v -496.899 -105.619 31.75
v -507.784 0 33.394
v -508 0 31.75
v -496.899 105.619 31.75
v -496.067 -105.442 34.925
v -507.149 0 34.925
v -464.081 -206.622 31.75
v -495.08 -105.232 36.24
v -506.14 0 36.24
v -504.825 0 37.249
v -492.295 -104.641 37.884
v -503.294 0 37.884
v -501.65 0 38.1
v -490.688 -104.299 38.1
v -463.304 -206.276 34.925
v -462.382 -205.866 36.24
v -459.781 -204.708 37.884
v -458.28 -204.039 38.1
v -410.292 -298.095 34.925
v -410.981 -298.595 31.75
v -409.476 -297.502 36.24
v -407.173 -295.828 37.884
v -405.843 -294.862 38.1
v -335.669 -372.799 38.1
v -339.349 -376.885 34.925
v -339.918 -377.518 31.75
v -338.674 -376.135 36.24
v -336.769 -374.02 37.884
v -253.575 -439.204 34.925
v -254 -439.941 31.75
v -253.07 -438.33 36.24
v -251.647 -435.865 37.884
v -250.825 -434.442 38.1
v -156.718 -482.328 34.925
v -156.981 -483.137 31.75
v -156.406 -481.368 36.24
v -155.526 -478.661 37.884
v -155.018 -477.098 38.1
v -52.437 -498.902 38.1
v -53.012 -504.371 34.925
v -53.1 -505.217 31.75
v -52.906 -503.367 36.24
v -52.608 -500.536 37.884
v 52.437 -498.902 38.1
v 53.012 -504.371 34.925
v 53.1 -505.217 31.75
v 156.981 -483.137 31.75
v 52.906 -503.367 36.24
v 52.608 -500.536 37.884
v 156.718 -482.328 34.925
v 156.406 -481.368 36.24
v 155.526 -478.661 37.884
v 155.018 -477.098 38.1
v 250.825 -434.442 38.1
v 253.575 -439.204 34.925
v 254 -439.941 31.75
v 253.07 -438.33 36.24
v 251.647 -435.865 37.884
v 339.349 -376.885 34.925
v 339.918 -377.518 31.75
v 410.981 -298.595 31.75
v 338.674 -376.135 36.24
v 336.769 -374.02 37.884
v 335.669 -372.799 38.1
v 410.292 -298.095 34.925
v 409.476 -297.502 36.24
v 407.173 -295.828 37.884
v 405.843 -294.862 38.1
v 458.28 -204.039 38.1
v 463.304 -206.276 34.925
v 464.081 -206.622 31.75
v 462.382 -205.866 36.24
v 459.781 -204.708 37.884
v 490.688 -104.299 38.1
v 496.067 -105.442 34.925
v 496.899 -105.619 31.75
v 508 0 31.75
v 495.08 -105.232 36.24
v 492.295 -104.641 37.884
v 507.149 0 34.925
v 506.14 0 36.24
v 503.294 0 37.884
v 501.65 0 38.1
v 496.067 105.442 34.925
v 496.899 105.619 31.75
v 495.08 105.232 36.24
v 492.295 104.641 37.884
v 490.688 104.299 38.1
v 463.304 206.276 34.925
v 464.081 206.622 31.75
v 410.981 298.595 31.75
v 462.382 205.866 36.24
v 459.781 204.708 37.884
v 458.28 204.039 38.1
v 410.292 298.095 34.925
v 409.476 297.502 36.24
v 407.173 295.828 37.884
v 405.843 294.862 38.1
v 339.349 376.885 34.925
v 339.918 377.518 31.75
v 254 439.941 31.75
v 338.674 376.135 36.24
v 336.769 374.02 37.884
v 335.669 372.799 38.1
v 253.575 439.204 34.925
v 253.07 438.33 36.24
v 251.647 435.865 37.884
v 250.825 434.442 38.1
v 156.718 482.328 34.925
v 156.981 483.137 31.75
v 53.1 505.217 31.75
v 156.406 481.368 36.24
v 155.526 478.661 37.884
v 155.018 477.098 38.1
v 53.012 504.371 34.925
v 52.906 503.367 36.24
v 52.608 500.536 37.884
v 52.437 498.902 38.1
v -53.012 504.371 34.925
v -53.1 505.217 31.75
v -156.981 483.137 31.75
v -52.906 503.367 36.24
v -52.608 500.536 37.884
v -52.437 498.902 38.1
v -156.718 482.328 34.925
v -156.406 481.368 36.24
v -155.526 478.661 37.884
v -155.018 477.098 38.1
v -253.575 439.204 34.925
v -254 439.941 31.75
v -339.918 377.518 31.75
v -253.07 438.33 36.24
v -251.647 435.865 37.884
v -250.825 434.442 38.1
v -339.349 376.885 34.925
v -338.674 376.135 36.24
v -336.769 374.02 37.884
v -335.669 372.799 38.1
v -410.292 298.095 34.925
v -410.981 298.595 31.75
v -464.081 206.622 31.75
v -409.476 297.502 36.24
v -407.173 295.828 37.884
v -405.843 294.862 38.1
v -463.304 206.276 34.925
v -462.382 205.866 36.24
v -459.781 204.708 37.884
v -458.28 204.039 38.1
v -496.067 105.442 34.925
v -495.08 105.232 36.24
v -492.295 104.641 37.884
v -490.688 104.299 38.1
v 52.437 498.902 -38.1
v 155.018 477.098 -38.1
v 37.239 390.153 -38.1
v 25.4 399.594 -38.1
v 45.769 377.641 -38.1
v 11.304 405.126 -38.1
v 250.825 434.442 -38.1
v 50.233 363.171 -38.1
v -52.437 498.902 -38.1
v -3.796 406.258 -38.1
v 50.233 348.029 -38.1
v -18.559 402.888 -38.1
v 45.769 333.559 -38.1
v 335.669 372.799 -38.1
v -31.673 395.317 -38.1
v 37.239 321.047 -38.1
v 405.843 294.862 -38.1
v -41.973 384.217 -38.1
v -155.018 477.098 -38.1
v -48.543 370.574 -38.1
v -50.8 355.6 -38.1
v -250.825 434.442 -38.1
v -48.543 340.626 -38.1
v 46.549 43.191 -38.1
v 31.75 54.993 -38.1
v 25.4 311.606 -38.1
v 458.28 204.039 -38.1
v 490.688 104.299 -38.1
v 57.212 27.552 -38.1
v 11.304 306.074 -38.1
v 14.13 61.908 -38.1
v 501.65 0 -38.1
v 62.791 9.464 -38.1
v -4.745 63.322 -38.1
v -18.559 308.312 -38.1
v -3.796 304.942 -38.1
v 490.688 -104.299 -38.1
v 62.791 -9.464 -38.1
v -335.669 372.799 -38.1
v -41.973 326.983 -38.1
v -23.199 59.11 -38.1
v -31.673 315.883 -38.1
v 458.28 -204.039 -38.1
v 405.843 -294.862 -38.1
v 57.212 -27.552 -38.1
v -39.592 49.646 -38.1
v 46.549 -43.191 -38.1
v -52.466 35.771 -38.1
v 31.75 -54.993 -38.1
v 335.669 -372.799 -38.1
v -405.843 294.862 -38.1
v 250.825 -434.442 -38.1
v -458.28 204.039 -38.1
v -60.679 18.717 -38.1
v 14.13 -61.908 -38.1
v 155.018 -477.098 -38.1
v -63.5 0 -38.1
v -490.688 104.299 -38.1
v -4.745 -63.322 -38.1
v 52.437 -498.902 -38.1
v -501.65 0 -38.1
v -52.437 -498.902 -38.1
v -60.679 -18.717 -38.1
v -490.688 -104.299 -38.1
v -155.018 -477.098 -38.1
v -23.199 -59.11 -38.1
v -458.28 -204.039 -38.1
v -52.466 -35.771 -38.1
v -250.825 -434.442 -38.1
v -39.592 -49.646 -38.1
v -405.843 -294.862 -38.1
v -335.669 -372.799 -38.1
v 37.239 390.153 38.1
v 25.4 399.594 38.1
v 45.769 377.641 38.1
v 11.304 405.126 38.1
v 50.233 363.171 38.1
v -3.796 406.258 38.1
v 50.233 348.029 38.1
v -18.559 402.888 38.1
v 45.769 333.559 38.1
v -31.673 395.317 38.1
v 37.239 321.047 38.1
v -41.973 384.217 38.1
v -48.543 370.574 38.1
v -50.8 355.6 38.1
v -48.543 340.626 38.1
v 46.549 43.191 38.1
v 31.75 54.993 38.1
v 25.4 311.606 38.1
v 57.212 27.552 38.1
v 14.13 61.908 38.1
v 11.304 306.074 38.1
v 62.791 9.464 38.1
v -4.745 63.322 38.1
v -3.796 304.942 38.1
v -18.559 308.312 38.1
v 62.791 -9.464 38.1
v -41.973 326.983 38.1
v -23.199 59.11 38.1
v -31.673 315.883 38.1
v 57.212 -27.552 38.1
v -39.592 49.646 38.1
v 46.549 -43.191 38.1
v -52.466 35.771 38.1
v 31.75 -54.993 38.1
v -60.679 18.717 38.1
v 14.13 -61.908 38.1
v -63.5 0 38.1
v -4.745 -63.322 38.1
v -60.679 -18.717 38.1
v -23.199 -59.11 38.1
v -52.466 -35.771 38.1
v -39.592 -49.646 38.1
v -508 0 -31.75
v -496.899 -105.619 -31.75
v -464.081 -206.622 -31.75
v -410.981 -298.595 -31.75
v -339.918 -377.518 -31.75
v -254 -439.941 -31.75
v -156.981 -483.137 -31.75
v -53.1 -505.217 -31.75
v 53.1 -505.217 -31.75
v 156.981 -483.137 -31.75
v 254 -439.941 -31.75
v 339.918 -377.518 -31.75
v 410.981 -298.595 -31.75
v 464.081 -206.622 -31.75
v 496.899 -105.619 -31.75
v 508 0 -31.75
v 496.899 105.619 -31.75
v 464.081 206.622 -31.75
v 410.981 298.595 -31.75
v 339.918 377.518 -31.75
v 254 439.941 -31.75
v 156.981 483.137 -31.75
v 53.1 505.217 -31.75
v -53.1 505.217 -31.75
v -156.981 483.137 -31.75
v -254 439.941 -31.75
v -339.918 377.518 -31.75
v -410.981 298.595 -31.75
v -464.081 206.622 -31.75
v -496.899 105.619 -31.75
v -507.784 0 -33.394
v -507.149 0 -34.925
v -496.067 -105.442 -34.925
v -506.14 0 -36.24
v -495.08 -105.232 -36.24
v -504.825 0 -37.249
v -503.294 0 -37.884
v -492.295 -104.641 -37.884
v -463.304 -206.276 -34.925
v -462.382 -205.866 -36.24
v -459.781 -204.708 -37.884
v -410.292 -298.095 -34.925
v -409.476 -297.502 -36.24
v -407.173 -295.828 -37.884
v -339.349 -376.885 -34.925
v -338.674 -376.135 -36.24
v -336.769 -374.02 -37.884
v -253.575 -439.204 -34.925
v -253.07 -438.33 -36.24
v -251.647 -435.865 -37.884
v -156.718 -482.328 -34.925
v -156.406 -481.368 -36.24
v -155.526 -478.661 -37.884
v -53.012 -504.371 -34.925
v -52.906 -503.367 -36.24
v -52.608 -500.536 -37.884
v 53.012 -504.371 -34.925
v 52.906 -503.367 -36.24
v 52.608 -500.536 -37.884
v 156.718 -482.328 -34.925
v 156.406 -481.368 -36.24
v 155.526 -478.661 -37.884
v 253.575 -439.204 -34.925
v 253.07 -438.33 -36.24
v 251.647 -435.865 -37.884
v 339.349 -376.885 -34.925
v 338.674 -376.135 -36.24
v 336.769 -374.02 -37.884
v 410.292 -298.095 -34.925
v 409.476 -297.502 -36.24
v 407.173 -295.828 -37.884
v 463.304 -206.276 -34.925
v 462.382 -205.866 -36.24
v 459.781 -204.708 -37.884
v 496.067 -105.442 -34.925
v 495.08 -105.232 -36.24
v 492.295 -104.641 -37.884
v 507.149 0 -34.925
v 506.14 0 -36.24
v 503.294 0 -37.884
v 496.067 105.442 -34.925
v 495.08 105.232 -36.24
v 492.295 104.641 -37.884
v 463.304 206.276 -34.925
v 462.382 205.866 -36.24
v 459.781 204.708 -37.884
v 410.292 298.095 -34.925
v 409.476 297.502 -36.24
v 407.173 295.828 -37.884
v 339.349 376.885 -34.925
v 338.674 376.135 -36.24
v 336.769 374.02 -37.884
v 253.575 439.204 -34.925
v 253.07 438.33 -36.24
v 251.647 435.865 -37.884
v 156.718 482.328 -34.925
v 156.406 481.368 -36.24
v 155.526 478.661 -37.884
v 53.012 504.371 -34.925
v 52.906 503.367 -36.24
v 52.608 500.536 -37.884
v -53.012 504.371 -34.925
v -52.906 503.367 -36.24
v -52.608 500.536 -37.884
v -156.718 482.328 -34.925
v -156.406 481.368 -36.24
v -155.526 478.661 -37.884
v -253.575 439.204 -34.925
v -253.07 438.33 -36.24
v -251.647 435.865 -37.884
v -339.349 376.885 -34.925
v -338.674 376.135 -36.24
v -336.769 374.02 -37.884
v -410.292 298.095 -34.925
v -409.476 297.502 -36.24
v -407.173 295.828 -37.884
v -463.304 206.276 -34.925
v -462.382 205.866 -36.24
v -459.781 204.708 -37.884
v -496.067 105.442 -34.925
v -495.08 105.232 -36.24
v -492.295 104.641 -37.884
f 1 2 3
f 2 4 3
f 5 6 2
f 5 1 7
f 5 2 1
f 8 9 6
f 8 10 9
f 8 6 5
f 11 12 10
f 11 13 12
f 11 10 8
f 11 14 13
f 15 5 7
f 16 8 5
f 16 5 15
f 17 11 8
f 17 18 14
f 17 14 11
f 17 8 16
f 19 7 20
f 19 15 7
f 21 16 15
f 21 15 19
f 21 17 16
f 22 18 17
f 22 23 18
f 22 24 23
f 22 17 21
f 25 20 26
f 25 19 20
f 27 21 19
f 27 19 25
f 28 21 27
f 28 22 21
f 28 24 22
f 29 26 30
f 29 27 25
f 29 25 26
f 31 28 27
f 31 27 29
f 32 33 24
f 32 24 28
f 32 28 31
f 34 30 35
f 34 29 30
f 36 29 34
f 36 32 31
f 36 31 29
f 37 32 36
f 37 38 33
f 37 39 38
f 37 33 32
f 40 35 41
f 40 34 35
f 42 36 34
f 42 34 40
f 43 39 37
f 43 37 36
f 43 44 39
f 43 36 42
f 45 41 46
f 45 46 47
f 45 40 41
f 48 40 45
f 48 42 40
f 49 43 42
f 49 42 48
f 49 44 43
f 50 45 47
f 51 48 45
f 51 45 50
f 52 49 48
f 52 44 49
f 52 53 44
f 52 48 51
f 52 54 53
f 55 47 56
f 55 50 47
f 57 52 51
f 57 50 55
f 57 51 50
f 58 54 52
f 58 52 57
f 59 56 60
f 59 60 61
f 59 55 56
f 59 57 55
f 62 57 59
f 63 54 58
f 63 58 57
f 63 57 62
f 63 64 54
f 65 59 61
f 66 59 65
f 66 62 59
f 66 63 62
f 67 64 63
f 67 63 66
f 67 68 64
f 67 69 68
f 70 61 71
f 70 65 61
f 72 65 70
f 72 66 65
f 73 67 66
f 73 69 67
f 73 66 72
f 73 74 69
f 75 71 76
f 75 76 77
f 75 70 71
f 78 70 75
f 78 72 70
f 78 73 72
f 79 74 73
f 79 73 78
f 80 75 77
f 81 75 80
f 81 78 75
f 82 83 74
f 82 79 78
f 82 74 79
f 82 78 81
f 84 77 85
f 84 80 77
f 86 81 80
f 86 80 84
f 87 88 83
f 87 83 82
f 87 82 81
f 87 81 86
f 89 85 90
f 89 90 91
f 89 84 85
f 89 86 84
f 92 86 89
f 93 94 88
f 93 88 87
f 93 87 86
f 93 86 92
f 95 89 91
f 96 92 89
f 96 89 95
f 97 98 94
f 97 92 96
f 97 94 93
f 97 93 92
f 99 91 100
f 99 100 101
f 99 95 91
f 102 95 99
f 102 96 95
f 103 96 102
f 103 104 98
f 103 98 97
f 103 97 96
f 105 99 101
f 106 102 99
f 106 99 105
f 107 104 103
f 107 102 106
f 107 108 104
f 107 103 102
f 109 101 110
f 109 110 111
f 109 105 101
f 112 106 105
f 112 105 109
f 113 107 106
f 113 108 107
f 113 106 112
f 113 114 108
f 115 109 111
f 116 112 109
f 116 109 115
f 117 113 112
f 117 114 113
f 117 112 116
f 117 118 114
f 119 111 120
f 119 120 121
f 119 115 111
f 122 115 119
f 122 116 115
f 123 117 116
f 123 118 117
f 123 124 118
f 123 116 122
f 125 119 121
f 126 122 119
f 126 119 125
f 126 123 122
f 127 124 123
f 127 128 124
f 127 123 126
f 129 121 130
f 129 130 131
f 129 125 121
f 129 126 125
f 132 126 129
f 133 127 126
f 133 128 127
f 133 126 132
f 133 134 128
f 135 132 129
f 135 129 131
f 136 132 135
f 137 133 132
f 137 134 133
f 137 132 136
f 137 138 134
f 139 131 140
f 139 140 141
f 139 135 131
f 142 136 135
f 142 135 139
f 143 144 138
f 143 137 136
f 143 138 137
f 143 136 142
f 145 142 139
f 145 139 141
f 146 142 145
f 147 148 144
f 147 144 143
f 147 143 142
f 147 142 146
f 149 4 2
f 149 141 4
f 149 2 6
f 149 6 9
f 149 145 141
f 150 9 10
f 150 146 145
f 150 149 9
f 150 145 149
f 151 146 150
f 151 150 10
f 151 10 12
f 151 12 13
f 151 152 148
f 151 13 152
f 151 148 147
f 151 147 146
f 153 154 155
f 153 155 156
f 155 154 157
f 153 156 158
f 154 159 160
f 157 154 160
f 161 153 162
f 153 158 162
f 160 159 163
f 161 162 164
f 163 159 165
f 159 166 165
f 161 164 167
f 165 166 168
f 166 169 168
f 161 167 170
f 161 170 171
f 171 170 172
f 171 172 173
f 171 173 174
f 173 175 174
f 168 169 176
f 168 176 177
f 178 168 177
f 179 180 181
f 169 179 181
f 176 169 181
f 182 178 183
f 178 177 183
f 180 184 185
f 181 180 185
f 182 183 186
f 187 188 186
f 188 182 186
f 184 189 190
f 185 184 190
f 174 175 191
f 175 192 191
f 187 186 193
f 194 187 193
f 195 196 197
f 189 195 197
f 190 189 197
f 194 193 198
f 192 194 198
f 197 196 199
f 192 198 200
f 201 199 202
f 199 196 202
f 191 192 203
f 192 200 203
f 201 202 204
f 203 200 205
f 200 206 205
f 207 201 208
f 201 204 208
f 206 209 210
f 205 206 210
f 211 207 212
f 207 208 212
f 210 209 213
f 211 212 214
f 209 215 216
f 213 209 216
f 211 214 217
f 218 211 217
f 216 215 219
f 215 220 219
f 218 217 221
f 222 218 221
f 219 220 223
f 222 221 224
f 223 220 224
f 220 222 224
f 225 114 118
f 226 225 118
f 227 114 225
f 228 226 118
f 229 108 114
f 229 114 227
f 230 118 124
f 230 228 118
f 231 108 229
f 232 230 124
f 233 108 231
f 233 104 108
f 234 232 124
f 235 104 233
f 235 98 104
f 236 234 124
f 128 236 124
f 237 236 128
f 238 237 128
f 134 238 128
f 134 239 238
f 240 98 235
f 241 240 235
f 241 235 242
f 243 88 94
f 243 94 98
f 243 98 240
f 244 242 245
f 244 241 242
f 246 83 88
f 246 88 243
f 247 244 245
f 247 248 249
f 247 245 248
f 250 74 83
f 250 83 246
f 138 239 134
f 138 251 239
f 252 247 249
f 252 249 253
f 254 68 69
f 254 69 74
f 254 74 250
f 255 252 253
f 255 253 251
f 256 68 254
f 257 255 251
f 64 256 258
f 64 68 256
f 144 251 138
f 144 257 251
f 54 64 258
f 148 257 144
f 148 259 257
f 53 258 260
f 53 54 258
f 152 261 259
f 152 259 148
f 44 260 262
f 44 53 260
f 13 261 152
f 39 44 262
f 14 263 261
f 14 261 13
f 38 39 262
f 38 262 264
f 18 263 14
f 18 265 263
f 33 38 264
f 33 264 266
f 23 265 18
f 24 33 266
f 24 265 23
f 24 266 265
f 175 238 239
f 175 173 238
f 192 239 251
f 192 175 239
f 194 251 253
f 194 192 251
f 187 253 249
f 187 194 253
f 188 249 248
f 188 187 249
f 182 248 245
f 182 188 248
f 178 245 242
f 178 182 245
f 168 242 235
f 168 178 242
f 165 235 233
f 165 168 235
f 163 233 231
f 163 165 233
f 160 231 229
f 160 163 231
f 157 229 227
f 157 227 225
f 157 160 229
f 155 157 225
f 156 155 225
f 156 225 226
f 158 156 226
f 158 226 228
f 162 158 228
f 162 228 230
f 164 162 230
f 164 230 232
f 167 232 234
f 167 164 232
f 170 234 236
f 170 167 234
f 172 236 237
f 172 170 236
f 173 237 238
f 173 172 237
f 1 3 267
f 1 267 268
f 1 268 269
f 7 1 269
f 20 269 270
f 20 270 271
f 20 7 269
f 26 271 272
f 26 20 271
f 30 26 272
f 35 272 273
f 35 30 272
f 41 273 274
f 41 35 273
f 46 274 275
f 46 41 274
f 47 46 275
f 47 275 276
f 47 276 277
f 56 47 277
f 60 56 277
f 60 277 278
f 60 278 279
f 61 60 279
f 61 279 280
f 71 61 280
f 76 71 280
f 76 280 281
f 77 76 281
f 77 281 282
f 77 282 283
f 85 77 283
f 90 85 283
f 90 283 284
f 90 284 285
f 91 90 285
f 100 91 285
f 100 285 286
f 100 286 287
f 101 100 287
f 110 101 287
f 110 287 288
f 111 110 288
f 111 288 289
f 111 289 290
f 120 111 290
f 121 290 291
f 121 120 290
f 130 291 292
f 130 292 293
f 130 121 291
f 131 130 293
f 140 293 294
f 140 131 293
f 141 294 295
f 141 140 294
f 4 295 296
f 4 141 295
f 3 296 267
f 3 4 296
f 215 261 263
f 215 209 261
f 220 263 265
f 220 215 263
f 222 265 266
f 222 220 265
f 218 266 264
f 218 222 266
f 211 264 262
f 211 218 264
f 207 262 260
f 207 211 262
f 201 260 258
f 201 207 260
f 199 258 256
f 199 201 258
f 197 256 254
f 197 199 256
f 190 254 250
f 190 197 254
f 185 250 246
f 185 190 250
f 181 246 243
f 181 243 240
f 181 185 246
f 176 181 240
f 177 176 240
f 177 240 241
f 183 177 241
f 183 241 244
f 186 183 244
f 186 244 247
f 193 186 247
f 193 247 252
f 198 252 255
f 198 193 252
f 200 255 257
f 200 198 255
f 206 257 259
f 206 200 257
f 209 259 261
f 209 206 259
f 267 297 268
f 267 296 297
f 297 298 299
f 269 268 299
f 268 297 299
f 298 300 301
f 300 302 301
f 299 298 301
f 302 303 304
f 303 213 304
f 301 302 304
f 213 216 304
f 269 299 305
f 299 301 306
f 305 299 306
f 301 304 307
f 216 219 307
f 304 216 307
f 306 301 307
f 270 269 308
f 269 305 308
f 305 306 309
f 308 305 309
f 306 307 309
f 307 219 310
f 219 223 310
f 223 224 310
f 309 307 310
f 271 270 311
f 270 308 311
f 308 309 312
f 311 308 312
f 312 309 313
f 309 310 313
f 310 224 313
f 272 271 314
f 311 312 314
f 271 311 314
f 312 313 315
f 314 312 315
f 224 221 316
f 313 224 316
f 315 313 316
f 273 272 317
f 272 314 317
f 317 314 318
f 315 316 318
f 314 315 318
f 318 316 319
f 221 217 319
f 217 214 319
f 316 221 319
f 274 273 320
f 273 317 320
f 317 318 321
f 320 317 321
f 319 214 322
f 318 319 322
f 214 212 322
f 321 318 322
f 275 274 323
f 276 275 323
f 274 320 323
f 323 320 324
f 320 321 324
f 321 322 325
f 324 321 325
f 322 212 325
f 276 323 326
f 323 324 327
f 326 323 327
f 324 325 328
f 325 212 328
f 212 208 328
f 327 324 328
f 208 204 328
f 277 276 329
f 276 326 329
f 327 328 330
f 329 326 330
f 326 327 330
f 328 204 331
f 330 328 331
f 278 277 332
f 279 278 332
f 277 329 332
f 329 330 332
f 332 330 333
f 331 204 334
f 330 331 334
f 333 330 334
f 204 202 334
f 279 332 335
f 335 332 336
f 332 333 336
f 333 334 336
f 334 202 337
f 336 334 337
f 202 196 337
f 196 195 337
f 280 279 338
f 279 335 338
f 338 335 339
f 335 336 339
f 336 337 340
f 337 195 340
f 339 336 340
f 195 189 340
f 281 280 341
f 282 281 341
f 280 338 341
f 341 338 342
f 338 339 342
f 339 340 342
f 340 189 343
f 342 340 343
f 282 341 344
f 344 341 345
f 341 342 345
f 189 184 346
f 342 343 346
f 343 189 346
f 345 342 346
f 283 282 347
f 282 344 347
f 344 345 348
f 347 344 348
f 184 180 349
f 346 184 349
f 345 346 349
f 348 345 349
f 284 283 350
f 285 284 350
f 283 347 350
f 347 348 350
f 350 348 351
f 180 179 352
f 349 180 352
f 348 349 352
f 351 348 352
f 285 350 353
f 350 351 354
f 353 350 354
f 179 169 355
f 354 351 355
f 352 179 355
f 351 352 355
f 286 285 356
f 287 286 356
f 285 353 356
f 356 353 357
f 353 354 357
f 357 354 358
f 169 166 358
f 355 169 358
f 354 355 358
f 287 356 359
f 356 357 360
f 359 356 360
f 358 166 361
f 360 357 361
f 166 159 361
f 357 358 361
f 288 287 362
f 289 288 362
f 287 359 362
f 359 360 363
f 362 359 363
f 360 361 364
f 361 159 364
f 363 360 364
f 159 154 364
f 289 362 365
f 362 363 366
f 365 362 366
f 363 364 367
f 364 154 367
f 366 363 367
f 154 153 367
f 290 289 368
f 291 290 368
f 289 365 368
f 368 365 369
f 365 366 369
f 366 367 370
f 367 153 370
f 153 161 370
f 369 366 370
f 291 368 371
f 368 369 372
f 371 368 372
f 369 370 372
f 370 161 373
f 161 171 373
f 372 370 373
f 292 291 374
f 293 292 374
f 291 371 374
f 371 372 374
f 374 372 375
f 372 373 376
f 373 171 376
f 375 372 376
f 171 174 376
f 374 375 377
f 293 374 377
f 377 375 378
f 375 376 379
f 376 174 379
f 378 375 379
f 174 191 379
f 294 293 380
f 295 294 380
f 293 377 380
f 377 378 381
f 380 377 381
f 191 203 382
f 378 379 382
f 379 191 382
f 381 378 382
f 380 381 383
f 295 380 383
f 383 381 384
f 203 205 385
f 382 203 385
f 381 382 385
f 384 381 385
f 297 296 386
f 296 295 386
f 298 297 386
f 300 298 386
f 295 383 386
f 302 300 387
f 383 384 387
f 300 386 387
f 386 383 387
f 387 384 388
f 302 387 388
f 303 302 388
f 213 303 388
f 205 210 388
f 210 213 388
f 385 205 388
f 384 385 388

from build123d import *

# Parameters (mm, degrees)
SKETCH1_R           = 508
SKETCH1_R_2         = 63.5
SKETCH1_R_3         = 50.8
BOSS_EXTRUDE1_DEPTH = 38.1
FILLET1_R           = 6.35


with BuildPart() as part:
    # Sketch1 → Boss-Extrude1 (new, symmetric)
    with BuildSketch(Plane.XY):
        with Locations(Location((0, 0, 0), (0, 0, 180))):
            Circle(SKETCH1_R)
        with Locations(Location((0, 0, 0), (0, 0, 180))):
            Circle(SKETCH1_R_2, mode=Mode.SUBTRACT)
        with Locations(Location((0, 355.6, 0), (0, 0, 180))):
            Circle(SKETCH1_R_3, mode=Mode.SUBTRACT)
    extrude(amount=BOSS_EXTRUDE1_DEPTH, both=True)

    # Fillet1
    fillet1_edges = [part.edges().sort_by_distance(p)[0] for p in [
        (508, 0, -38.1),
        (508, 0, 38.1),
    ]]
    fillet(fillet1_edges, radius=FILLET1_R)


solid = part.part
